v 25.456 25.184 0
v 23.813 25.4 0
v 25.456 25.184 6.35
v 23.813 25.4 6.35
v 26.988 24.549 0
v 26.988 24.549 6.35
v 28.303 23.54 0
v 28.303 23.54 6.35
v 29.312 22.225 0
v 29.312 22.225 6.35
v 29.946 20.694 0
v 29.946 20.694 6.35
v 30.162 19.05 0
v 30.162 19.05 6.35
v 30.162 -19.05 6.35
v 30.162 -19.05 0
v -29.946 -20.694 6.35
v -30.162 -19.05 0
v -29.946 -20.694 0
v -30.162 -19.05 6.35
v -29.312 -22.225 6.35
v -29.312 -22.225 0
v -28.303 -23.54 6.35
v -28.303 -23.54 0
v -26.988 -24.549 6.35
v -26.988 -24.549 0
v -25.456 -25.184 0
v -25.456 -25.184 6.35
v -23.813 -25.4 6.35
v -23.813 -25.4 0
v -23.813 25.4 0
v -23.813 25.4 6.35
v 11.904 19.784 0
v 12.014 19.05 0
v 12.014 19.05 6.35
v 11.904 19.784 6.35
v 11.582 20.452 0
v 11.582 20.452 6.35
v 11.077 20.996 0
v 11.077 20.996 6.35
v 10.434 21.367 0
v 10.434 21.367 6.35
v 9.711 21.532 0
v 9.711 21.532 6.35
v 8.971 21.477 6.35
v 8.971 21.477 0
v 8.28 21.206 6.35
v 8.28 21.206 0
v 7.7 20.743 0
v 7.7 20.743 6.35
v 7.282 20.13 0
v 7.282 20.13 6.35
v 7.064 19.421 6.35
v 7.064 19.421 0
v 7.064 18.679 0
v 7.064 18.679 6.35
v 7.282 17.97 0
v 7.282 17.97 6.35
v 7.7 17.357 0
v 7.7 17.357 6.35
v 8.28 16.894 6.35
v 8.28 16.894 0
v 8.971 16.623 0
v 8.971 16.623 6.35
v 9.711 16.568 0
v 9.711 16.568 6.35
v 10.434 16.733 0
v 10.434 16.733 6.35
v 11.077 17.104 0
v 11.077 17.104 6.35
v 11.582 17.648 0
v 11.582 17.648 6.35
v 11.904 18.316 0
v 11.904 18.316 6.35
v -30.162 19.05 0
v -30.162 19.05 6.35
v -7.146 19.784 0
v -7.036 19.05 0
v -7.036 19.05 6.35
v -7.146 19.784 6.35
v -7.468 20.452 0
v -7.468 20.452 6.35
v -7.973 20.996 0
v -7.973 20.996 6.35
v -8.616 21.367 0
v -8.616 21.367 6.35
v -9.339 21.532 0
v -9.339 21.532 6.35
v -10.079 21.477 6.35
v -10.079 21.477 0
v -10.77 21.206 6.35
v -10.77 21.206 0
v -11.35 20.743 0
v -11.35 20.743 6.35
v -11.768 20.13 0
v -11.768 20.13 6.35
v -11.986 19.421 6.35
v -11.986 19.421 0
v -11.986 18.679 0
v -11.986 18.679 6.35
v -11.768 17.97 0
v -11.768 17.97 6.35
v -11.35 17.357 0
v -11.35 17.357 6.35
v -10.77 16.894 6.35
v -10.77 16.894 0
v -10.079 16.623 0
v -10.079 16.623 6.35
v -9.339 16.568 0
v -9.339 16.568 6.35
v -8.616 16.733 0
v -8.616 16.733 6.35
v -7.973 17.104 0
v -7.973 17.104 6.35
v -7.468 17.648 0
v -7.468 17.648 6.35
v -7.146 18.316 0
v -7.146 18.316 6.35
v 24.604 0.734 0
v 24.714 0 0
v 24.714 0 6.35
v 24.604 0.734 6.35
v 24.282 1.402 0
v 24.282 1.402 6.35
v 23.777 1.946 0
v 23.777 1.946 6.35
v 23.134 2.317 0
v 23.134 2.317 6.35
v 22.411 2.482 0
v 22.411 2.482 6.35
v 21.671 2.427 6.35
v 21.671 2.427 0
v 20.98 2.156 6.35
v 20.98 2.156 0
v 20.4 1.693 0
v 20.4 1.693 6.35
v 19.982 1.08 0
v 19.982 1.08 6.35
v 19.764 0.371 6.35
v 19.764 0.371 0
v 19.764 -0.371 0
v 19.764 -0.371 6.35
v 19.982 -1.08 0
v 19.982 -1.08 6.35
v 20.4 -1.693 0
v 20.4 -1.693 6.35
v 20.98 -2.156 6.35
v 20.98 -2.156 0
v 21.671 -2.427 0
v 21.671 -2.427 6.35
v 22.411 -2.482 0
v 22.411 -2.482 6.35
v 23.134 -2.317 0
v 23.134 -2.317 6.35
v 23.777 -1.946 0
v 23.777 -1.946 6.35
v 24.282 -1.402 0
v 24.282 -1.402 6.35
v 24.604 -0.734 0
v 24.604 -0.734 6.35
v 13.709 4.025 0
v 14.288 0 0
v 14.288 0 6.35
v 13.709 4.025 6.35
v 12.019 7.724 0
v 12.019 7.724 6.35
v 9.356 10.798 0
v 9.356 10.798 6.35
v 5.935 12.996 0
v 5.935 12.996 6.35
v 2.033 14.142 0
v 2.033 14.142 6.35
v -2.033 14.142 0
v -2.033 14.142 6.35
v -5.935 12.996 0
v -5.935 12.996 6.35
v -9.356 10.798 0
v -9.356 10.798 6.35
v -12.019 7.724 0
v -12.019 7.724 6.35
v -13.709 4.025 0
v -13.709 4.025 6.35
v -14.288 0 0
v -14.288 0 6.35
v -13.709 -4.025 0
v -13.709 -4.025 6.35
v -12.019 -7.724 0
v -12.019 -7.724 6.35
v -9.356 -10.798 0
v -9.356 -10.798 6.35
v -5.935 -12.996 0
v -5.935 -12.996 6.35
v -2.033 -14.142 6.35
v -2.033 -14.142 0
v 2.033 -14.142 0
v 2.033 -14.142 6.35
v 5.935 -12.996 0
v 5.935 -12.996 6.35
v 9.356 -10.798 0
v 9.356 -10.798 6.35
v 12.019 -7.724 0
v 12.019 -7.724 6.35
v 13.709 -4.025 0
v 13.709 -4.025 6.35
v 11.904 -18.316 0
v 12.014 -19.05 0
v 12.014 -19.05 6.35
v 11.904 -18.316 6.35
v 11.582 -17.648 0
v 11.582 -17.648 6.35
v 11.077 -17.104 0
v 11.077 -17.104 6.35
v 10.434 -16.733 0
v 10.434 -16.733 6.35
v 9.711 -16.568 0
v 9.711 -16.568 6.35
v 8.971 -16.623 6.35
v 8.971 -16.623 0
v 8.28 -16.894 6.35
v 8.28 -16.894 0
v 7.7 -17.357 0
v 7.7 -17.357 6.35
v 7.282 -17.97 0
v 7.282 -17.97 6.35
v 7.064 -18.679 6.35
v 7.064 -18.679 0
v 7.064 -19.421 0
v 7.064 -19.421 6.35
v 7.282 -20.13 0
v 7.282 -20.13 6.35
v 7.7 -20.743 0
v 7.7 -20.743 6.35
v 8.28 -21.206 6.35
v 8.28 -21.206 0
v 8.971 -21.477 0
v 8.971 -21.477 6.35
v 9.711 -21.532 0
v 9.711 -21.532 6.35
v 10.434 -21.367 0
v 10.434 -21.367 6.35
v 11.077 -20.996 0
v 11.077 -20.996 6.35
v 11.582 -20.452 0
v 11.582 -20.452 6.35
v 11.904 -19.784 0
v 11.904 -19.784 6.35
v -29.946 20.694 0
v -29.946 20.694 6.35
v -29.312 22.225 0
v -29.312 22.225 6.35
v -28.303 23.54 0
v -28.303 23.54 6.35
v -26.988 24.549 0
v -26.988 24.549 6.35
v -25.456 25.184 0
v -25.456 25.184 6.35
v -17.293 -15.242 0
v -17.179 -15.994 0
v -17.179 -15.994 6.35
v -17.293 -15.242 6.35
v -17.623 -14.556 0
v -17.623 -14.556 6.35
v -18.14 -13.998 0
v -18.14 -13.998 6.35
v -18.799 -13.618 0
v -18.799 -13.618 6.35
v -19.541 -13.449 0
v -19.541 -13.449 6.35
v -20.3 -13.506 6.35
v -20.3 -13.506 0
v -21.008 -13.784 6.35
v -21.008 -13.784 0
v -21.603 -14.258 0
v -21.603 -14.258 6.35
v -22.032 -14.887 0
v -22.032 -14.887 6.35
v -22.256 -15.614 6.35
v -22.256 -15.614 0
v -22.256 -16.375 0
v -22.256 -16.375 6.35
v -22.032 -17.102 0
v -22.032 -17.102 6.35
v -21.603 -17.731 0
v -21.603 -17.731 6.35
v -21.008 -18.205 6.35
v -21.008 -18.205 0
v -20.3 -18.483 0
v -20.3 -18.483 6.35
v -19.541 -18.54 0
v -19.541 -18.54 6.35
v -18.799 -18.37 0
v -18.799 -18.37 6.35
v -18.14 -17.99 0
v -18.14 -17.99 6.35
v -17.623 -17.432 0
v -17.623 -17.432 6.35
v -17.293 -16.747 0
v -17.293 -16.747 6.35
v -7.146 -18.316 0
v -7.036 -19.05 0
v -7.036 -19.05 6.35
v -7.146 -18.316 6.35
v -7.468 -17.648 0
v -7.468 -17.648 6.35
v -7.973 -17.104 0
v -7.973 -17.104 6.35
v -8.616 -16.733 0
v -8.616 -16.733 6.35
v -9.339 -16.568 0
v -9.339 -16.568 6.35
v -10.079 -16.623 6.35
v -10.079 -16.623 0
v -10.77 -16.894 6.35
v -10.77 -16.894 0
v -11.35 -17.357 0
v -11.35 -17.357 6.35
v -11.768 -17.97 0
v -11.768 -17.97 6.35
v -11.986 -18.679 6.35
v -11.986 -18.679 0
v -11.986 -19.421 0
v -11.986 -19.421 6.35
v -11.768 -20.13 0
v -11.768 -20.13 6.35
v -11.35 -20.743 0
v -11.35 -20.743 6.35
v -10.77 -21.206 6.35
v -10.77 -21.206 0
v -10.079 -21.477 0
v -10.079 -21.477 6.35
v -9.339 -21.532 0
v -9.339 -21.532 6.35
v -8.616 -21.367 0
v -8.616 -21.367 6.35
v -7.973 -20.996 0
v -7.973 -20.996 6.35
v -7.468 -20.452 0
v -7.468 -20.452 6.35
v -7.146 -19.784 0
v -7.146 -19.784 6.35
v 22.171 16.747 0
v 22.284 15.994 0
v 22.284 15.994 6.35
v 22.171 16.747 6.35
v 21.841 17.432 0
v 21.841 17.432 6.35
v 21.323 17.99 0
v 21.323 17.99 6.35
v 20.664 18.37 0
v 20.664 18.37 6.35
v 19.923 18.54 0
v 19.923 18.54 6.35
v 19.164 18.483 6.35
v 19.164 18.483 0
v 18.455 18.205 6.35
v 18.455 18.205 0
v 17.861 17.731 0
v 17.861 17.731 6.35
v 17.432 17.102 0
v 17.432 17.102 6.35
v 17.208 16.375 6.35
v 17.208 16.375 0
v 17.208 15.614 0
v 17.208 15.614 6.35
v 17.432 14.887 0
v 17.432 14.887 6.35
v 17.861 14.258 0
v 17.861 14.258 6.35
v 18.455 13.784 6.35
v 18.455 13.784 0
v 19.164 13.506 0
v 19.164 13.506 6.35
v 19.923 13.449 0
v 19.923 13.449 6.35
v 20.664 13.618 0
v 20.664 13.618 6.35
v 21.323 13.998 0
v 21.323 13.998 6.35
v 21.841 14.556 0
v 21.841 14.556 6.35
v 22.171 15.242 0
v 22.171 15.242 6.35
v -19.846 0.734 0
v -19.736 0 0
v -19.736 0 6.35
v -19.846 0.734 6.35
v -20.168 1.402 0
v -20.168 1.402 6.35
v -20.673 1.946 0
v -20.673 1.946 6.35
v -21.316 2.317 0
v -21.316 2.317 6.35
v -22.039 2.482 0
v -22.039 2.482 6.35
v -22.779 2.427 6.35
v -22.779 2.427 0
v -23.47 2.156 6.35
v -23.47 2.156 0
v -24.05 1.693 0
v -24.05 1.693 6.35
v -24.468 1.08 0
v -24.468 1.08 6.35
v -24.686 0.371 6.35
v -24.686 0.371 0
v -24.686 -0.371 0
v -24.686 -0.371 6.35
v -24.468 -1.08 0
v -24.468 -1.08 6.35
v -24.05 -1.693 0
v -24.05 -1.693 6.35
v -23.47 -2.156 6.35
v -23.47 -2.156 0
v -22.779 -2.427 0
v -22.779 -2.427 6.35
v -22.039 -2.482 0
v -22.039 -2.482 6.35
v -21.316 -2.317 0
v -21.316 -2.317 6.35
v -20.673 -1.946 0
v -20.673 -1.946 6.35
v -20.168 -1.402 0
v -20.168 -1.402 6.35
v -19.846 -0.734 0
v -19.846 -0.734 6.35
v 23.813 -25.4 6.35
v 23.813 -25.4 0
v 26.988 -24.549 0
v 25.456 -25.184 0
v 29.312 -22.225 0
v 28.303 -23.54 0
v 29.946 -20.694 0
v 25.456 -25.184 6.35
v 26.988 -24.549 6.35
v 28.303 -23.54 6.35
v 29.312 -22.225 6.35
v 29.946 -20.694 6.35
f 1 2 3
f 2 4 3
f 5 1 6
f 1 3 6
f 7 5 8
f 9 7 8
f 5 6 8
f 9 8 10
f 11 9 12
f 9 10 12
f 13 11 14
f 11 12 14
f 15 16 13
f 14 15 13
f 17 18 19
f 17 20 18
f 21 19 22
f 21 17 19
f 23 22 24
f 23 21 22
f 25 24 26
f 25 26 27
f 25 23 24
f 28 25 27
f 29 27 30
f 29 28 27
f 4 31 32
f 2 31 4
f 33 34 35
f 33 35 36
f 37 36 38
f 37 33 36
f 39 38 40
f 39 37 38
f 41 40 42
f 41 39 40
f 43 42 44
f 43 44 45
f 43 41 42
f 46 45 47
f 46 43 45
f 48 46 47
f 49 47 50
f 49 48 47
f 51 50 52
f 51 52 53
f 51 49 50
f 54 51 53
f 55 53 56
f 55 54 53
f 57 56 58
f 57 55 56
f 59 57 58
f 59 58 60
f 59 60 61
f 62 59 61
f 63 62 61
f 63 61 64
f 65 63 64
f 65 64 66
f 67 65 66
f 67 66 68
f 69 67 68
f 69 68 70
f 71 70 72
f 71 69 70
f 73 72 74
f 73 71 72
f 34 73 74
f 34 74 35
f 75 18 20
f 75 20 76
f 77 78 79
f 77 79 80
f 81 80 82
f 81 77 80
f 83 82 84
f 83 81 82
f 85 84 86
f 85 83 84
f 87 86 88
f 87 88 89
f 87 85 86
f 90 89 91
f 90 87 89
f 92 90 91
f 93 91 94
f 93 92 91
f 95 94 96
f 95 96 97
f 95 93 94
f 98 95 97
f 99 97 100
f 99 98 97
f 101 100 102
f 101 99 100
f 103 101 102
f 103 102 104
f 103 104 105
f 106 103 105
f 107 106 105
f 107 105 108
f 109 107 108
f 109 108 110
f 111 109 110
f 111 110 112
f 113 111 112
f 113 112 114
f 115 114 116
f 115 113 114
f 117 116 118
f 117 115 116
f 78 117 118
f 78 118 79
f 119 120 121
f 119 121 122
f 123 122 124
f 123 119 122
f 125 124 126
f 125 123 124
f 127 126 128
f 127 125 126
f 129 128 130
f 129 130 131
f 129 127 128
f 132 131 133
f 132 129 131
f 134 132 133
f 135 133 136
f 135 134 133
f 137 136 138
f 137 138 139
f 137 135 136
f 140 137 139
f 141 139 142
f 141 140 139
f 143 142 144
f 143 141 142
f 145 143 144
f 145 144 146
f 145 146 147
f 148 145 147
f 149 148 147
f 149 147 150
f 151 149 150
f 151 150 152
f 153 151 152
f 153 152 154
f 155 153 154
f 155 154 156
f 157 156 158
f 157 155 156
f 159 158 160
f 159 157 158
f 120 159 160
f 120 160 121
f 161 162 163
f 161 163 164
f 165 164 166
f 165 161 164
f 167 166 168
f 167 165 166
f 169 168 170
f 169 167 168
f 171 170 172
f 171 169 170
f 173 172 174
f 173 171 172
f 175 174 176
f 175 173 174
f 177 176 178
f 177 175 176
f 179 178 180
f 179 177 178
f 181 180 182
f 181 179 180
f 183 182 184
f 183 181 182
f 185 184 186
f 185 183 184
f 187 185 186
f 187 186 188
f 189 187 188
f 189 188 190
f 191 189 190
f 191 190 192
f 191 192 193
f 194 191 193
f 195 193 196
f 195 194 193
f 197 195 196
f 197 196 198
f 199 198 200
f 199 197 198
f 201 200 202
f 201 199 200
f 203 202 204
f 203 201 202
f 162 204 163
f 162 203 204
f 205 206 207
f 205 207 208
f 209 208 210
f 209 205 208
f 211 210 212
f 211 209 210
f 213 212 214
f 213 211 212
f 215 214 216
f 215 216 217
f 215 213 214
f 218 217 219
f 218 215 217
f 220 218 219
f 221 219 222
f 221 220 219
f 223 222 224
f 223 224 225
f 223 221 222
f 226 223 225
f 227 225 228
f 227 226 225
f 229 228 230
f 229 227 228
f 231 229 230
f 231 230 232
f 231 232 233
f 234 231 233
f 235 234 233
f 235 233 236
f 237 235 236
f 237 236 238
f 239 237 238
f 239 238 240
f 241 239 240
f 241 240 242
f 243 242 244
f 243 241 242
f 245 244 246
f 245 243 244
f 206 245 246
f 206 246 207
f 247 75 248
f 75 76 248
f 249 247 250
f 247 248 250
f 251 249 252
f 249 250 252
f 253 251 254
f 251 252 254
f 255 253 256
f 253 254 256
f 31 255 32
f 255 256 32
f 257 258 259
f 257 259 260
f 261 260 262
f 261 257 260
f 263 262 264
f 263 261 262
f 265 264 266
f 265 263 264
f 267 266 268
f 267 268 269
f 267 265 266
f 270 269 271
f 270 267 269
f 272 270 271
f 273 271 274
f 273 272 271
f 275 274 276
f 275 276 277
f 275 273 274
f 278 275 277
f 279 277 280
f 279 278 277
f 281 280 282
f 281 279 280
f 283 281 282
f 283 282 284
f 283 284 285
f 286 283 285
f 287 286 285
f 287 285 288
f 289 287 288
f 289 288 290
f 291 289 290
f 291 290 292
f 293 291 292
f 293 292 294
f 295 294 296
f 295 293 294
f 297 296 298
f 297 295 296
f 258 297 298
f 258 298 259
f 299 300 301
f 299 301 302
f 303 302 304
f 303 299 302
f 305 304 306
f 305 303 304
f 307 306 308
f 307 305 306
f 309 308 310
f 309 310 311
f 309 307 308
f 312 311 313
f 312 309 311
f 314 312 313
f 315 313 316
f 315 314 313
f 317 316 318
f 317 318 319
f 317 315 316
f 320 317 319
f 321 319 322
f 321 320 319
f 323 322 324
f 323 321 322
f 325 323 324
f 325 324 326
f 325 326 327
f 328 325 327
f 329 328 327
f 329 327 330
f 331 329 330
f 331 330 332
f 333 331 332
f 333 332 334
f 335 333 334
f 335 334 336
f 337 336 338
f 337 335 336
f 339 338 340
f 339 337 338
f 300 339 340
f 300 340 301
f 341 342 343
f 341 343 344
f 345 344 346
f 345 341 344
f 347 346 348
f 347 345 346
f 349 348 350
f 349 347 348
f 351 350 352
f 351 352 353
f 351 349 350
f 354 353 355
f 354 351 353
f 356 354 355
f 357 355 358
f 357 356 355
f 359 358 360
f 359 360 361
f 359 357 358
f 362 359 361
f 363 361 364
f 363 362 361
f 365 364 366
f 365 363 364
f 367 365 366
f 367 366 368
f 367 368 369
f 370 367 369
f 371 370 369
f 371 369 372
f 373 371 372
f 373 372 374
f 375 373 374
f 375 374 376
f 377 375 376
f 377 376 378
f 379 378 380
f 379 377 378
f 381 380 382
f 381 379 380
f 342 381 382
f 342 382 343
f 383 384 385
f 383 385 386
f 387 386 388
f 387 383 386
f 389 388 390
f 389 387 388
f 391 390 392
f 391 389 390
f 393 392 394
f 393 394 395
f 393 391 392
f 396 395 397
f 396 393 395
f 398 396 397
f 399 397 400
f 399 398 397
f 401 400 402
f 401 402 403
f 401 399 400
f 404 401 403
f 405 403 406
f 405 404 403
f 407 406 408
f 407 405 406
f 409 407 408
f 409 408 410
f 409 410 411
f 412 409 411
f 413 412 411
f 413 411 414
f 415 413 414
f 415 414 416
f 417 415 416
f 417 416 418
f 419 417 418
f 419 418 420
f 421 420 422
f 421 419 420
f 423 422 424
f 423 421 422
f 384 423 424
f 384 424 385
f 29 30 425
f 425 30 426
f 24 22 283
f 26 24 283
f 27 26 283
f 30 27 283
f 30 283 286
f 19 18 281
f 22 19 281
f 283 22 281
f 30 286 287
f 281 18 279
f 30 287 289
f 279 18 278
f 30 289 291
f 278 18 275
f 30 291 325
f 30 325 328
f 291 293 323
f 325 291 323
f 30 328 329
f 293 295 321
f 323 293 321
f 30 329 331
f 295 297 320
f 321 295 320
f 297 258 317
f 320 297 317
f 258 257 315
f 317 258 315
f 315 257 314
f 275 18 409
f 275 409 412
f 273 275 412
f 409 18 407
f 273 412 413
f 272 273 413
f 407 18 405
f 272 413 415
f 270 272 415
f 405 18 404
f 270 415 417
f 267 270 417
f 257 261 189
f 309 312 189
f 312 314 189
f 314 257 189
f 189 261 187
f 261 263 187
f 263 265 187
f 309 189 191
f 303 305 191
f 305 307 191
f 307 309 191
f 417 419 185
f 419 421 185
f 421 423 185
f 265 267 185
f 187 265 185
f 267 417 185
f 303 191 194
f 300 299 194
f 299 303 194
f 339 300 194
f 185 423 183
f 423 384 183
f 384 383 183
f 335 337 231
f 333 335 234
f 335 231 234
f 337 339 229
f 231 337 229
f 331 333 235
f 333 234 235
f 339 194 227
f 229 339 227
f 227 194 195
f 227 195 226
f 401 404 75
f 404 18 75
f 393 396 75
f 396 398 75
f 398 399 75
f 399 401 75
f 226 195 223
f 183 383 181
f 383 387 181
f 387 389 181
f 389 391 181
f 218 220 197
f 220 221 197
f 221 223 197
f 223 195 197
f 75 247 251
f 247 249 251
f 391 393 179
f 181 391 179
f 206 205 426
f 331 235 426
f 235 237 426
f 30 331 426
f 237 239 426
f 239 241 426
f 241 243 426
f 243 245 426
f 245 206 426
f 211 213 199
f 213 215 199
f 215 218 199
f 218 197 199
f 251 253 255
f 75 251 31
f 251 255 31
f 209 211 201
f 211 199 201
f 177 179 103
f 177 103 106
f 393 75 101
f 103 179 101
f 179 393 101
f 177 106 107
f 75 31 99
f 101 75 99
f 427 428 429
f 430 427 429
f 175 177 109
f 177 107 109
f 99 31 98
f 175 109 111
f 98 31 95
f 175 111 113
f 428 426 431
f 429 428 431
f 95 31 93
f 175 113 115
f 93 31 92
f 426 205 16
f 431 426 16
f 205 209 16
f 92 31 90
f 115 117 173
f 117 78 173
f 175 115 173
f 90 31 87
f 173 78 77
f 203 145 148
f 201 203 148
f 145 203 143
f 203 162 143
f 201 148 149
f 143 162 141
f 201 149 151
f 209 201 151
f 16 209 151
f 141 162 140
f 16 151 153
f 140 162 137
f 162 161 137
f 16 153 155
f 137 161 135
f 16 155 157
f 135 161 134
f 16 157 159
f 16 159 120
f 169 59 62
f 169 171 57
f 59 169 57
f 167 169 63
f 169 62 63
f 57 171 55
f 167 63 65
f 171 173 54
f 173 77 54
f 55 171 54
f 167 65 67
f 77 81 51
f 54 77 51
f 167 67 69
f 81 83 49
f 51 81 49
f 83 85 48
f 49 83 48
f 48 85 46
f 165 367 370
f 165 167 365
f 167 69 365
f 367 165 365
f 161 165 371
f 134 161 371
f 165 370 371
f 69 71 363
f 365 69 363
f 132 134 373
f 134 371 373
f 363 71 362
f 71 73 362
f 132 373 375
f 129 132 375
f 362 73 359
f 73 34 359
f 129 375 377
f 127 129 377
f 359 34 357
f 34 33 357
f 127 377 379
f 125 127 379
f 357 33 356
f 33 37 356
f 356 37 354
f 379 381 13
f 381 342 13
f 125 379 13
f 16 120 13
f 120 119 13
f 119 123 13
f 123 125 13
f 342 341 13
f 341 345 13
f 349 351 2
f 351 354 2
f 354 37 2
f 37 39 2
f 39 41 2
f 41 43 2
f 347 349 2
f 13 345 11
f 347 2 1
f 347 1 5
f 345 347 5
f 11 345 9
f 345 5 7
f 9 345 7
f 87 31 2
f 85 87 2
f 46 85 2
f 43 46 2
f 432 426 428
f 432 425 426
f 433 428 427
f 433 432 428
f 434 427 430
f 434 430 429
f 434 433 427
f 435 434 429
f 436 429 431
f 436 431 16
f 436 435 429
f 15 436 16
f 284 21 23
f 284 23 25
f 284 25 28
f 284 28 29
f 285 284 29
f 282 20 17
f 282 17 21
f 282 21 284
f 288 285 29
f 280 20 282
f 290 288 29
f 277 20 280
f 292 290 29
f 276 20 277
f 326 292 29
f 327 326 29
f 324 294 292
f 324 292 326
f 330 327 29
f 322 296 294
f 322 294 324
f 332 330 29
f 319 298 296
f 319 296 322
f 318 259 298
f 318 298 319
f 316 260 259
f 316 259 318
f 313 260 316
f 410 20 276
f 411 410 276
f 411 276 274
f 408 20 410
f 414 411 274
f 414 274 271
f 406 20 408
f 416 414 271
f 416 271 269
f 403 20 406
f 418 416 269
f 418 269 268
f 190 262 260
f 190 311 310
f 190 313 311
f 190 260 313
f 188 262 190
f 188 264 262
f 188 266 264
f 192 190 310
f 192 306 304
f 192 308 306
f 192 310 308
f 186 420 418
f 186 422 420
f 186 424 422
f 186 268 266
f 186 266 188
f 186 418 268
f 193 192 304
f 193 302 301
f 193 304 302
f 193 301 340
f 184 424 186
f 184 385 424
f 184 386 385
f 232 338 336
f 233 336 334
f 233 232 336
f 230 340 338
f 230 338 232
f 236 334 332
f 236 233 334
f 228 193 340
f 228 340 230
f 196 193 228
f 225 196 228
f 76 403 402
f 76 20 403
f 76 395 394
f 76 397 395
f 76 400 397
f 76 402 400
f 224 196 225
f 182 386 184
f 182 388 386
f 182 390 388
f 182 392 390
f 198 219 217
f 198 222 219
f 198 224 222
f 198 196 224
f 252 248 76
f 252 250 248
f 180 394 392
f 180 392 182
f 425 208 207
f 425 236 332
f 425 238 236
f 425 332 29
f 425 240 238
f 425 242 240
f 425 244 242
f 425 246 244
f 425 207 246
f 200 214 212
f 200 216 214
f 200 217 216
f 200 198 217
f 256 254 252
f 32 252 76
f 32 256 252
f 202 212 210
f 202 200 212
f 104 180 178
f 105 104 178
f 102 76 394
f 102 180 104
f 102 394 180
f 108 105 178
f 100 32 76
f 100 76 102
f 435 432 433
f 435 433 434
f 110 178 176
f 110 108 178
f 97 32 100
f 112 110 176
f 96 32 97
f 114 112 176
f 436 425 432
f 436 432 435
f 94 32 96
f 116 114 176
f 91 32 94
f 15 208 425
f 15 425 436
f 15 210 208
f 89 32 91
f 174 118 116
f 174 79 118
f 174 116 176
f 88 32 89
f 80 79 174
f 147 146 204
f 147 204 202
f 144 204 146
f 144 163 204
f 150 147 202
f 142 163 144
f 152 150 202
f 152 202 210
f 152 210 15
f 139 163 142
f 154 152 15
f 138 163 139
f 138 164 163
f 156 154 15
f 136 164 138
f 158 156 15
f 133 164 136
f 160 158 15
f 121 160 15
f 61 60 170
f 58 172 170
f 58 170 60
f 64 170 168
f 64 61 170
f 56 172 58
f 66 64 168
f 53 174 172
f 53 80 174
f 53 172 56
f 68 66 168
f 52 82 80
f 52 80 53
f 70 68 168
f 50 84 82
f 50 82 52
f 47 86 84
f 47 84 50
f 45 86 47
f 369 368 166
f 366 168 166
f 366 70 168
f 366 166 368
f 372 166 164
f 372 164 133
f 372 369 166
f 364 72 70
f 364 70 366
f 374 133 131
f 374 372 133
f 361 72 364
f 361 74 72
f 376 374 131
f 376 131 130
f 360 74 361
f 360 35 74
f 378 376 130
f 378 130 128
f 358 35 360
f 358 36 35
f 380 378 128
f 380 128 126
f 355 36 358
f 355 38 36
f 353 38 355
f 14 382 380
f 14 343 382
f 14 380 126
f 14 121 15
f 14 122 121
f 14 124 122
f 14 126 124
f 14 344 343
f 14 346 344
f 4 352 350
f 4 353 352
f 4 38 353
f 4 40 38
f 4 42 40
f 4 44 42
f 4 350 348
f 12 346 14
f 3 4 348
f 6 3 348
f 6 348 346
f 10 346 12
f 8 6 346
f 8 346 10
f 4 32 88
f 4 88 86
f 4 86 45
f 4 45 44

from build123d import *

# Parameters (mm, degrees)
SKETCH1_W           = 60.325
SKETCH1_H           = 50.8
SKETCH1_R           = 2.4892
SKETCH1_R_2         = 2.5527
SKETCH1_R_3         = 14.2875
BOSS_EXTRUDE1_DEPTH = 6.35
FILLET1_R           = 6.35


with BuildPart() as part:
    # Sketch1 → Boss-Extrude1 (new body)
    with BuildSketch(Plane.XY):
        Rectangle(SKETCH1_W, SKETCH1_H)
        with Locations((-9.525, -19.05)):
            Circle(SKETCH1_R, mode=Mode.SUBTRACT)
        with Locations((9.525, -19.05)):
            Circle(SKETCH1_R, mode=Mode.SUBTRACT)
        with Locations((9.525, 19.05)):
            Circle(SKETCH1_R, mode=Mode.SUBTRACT)
        with Locations((-9.525, 19.05)):
            Circle(SKETCH1_R, mode=Mode.SUBTRACT)
        with Locations((22.225, 0)):
            Circle(SKETCH1_R, mode=Mode.SUBTRACT)
        with Locations((-22.225, 0)):
            Circle(SKETCH1_R, mode=Mode.SUBTRACT)
        with Locations((-19.731795339, -15.994256867)):
            Circle(SKETCH1_R_2, mode=Mode.SUBTRACT)
        with Locations((19.731795339, 15.994256867)):
            Circle(SKETCH1_R_2, mode=Mode.SUBTRACT)
        Circle(SKETCH1_R_3, mode=Mode.SUBTRACT)
    extrude(amount=BOSS_EXTRUDE1_DEPTH)

    # Fillet1
    fillet1_edges = [part.edges().sort_by_distance(p)[0] for p in [
        (30.1625, -25.4, 3.175),
        (-30.1625, -25.4, 3.175),
        (-30.1625, 25.4, 3.175),
        (30.1625, 25.4, 3.175),
    ]]
    fillet(fillet1_edges, radius=FILLET1_R)


solid = part.part
